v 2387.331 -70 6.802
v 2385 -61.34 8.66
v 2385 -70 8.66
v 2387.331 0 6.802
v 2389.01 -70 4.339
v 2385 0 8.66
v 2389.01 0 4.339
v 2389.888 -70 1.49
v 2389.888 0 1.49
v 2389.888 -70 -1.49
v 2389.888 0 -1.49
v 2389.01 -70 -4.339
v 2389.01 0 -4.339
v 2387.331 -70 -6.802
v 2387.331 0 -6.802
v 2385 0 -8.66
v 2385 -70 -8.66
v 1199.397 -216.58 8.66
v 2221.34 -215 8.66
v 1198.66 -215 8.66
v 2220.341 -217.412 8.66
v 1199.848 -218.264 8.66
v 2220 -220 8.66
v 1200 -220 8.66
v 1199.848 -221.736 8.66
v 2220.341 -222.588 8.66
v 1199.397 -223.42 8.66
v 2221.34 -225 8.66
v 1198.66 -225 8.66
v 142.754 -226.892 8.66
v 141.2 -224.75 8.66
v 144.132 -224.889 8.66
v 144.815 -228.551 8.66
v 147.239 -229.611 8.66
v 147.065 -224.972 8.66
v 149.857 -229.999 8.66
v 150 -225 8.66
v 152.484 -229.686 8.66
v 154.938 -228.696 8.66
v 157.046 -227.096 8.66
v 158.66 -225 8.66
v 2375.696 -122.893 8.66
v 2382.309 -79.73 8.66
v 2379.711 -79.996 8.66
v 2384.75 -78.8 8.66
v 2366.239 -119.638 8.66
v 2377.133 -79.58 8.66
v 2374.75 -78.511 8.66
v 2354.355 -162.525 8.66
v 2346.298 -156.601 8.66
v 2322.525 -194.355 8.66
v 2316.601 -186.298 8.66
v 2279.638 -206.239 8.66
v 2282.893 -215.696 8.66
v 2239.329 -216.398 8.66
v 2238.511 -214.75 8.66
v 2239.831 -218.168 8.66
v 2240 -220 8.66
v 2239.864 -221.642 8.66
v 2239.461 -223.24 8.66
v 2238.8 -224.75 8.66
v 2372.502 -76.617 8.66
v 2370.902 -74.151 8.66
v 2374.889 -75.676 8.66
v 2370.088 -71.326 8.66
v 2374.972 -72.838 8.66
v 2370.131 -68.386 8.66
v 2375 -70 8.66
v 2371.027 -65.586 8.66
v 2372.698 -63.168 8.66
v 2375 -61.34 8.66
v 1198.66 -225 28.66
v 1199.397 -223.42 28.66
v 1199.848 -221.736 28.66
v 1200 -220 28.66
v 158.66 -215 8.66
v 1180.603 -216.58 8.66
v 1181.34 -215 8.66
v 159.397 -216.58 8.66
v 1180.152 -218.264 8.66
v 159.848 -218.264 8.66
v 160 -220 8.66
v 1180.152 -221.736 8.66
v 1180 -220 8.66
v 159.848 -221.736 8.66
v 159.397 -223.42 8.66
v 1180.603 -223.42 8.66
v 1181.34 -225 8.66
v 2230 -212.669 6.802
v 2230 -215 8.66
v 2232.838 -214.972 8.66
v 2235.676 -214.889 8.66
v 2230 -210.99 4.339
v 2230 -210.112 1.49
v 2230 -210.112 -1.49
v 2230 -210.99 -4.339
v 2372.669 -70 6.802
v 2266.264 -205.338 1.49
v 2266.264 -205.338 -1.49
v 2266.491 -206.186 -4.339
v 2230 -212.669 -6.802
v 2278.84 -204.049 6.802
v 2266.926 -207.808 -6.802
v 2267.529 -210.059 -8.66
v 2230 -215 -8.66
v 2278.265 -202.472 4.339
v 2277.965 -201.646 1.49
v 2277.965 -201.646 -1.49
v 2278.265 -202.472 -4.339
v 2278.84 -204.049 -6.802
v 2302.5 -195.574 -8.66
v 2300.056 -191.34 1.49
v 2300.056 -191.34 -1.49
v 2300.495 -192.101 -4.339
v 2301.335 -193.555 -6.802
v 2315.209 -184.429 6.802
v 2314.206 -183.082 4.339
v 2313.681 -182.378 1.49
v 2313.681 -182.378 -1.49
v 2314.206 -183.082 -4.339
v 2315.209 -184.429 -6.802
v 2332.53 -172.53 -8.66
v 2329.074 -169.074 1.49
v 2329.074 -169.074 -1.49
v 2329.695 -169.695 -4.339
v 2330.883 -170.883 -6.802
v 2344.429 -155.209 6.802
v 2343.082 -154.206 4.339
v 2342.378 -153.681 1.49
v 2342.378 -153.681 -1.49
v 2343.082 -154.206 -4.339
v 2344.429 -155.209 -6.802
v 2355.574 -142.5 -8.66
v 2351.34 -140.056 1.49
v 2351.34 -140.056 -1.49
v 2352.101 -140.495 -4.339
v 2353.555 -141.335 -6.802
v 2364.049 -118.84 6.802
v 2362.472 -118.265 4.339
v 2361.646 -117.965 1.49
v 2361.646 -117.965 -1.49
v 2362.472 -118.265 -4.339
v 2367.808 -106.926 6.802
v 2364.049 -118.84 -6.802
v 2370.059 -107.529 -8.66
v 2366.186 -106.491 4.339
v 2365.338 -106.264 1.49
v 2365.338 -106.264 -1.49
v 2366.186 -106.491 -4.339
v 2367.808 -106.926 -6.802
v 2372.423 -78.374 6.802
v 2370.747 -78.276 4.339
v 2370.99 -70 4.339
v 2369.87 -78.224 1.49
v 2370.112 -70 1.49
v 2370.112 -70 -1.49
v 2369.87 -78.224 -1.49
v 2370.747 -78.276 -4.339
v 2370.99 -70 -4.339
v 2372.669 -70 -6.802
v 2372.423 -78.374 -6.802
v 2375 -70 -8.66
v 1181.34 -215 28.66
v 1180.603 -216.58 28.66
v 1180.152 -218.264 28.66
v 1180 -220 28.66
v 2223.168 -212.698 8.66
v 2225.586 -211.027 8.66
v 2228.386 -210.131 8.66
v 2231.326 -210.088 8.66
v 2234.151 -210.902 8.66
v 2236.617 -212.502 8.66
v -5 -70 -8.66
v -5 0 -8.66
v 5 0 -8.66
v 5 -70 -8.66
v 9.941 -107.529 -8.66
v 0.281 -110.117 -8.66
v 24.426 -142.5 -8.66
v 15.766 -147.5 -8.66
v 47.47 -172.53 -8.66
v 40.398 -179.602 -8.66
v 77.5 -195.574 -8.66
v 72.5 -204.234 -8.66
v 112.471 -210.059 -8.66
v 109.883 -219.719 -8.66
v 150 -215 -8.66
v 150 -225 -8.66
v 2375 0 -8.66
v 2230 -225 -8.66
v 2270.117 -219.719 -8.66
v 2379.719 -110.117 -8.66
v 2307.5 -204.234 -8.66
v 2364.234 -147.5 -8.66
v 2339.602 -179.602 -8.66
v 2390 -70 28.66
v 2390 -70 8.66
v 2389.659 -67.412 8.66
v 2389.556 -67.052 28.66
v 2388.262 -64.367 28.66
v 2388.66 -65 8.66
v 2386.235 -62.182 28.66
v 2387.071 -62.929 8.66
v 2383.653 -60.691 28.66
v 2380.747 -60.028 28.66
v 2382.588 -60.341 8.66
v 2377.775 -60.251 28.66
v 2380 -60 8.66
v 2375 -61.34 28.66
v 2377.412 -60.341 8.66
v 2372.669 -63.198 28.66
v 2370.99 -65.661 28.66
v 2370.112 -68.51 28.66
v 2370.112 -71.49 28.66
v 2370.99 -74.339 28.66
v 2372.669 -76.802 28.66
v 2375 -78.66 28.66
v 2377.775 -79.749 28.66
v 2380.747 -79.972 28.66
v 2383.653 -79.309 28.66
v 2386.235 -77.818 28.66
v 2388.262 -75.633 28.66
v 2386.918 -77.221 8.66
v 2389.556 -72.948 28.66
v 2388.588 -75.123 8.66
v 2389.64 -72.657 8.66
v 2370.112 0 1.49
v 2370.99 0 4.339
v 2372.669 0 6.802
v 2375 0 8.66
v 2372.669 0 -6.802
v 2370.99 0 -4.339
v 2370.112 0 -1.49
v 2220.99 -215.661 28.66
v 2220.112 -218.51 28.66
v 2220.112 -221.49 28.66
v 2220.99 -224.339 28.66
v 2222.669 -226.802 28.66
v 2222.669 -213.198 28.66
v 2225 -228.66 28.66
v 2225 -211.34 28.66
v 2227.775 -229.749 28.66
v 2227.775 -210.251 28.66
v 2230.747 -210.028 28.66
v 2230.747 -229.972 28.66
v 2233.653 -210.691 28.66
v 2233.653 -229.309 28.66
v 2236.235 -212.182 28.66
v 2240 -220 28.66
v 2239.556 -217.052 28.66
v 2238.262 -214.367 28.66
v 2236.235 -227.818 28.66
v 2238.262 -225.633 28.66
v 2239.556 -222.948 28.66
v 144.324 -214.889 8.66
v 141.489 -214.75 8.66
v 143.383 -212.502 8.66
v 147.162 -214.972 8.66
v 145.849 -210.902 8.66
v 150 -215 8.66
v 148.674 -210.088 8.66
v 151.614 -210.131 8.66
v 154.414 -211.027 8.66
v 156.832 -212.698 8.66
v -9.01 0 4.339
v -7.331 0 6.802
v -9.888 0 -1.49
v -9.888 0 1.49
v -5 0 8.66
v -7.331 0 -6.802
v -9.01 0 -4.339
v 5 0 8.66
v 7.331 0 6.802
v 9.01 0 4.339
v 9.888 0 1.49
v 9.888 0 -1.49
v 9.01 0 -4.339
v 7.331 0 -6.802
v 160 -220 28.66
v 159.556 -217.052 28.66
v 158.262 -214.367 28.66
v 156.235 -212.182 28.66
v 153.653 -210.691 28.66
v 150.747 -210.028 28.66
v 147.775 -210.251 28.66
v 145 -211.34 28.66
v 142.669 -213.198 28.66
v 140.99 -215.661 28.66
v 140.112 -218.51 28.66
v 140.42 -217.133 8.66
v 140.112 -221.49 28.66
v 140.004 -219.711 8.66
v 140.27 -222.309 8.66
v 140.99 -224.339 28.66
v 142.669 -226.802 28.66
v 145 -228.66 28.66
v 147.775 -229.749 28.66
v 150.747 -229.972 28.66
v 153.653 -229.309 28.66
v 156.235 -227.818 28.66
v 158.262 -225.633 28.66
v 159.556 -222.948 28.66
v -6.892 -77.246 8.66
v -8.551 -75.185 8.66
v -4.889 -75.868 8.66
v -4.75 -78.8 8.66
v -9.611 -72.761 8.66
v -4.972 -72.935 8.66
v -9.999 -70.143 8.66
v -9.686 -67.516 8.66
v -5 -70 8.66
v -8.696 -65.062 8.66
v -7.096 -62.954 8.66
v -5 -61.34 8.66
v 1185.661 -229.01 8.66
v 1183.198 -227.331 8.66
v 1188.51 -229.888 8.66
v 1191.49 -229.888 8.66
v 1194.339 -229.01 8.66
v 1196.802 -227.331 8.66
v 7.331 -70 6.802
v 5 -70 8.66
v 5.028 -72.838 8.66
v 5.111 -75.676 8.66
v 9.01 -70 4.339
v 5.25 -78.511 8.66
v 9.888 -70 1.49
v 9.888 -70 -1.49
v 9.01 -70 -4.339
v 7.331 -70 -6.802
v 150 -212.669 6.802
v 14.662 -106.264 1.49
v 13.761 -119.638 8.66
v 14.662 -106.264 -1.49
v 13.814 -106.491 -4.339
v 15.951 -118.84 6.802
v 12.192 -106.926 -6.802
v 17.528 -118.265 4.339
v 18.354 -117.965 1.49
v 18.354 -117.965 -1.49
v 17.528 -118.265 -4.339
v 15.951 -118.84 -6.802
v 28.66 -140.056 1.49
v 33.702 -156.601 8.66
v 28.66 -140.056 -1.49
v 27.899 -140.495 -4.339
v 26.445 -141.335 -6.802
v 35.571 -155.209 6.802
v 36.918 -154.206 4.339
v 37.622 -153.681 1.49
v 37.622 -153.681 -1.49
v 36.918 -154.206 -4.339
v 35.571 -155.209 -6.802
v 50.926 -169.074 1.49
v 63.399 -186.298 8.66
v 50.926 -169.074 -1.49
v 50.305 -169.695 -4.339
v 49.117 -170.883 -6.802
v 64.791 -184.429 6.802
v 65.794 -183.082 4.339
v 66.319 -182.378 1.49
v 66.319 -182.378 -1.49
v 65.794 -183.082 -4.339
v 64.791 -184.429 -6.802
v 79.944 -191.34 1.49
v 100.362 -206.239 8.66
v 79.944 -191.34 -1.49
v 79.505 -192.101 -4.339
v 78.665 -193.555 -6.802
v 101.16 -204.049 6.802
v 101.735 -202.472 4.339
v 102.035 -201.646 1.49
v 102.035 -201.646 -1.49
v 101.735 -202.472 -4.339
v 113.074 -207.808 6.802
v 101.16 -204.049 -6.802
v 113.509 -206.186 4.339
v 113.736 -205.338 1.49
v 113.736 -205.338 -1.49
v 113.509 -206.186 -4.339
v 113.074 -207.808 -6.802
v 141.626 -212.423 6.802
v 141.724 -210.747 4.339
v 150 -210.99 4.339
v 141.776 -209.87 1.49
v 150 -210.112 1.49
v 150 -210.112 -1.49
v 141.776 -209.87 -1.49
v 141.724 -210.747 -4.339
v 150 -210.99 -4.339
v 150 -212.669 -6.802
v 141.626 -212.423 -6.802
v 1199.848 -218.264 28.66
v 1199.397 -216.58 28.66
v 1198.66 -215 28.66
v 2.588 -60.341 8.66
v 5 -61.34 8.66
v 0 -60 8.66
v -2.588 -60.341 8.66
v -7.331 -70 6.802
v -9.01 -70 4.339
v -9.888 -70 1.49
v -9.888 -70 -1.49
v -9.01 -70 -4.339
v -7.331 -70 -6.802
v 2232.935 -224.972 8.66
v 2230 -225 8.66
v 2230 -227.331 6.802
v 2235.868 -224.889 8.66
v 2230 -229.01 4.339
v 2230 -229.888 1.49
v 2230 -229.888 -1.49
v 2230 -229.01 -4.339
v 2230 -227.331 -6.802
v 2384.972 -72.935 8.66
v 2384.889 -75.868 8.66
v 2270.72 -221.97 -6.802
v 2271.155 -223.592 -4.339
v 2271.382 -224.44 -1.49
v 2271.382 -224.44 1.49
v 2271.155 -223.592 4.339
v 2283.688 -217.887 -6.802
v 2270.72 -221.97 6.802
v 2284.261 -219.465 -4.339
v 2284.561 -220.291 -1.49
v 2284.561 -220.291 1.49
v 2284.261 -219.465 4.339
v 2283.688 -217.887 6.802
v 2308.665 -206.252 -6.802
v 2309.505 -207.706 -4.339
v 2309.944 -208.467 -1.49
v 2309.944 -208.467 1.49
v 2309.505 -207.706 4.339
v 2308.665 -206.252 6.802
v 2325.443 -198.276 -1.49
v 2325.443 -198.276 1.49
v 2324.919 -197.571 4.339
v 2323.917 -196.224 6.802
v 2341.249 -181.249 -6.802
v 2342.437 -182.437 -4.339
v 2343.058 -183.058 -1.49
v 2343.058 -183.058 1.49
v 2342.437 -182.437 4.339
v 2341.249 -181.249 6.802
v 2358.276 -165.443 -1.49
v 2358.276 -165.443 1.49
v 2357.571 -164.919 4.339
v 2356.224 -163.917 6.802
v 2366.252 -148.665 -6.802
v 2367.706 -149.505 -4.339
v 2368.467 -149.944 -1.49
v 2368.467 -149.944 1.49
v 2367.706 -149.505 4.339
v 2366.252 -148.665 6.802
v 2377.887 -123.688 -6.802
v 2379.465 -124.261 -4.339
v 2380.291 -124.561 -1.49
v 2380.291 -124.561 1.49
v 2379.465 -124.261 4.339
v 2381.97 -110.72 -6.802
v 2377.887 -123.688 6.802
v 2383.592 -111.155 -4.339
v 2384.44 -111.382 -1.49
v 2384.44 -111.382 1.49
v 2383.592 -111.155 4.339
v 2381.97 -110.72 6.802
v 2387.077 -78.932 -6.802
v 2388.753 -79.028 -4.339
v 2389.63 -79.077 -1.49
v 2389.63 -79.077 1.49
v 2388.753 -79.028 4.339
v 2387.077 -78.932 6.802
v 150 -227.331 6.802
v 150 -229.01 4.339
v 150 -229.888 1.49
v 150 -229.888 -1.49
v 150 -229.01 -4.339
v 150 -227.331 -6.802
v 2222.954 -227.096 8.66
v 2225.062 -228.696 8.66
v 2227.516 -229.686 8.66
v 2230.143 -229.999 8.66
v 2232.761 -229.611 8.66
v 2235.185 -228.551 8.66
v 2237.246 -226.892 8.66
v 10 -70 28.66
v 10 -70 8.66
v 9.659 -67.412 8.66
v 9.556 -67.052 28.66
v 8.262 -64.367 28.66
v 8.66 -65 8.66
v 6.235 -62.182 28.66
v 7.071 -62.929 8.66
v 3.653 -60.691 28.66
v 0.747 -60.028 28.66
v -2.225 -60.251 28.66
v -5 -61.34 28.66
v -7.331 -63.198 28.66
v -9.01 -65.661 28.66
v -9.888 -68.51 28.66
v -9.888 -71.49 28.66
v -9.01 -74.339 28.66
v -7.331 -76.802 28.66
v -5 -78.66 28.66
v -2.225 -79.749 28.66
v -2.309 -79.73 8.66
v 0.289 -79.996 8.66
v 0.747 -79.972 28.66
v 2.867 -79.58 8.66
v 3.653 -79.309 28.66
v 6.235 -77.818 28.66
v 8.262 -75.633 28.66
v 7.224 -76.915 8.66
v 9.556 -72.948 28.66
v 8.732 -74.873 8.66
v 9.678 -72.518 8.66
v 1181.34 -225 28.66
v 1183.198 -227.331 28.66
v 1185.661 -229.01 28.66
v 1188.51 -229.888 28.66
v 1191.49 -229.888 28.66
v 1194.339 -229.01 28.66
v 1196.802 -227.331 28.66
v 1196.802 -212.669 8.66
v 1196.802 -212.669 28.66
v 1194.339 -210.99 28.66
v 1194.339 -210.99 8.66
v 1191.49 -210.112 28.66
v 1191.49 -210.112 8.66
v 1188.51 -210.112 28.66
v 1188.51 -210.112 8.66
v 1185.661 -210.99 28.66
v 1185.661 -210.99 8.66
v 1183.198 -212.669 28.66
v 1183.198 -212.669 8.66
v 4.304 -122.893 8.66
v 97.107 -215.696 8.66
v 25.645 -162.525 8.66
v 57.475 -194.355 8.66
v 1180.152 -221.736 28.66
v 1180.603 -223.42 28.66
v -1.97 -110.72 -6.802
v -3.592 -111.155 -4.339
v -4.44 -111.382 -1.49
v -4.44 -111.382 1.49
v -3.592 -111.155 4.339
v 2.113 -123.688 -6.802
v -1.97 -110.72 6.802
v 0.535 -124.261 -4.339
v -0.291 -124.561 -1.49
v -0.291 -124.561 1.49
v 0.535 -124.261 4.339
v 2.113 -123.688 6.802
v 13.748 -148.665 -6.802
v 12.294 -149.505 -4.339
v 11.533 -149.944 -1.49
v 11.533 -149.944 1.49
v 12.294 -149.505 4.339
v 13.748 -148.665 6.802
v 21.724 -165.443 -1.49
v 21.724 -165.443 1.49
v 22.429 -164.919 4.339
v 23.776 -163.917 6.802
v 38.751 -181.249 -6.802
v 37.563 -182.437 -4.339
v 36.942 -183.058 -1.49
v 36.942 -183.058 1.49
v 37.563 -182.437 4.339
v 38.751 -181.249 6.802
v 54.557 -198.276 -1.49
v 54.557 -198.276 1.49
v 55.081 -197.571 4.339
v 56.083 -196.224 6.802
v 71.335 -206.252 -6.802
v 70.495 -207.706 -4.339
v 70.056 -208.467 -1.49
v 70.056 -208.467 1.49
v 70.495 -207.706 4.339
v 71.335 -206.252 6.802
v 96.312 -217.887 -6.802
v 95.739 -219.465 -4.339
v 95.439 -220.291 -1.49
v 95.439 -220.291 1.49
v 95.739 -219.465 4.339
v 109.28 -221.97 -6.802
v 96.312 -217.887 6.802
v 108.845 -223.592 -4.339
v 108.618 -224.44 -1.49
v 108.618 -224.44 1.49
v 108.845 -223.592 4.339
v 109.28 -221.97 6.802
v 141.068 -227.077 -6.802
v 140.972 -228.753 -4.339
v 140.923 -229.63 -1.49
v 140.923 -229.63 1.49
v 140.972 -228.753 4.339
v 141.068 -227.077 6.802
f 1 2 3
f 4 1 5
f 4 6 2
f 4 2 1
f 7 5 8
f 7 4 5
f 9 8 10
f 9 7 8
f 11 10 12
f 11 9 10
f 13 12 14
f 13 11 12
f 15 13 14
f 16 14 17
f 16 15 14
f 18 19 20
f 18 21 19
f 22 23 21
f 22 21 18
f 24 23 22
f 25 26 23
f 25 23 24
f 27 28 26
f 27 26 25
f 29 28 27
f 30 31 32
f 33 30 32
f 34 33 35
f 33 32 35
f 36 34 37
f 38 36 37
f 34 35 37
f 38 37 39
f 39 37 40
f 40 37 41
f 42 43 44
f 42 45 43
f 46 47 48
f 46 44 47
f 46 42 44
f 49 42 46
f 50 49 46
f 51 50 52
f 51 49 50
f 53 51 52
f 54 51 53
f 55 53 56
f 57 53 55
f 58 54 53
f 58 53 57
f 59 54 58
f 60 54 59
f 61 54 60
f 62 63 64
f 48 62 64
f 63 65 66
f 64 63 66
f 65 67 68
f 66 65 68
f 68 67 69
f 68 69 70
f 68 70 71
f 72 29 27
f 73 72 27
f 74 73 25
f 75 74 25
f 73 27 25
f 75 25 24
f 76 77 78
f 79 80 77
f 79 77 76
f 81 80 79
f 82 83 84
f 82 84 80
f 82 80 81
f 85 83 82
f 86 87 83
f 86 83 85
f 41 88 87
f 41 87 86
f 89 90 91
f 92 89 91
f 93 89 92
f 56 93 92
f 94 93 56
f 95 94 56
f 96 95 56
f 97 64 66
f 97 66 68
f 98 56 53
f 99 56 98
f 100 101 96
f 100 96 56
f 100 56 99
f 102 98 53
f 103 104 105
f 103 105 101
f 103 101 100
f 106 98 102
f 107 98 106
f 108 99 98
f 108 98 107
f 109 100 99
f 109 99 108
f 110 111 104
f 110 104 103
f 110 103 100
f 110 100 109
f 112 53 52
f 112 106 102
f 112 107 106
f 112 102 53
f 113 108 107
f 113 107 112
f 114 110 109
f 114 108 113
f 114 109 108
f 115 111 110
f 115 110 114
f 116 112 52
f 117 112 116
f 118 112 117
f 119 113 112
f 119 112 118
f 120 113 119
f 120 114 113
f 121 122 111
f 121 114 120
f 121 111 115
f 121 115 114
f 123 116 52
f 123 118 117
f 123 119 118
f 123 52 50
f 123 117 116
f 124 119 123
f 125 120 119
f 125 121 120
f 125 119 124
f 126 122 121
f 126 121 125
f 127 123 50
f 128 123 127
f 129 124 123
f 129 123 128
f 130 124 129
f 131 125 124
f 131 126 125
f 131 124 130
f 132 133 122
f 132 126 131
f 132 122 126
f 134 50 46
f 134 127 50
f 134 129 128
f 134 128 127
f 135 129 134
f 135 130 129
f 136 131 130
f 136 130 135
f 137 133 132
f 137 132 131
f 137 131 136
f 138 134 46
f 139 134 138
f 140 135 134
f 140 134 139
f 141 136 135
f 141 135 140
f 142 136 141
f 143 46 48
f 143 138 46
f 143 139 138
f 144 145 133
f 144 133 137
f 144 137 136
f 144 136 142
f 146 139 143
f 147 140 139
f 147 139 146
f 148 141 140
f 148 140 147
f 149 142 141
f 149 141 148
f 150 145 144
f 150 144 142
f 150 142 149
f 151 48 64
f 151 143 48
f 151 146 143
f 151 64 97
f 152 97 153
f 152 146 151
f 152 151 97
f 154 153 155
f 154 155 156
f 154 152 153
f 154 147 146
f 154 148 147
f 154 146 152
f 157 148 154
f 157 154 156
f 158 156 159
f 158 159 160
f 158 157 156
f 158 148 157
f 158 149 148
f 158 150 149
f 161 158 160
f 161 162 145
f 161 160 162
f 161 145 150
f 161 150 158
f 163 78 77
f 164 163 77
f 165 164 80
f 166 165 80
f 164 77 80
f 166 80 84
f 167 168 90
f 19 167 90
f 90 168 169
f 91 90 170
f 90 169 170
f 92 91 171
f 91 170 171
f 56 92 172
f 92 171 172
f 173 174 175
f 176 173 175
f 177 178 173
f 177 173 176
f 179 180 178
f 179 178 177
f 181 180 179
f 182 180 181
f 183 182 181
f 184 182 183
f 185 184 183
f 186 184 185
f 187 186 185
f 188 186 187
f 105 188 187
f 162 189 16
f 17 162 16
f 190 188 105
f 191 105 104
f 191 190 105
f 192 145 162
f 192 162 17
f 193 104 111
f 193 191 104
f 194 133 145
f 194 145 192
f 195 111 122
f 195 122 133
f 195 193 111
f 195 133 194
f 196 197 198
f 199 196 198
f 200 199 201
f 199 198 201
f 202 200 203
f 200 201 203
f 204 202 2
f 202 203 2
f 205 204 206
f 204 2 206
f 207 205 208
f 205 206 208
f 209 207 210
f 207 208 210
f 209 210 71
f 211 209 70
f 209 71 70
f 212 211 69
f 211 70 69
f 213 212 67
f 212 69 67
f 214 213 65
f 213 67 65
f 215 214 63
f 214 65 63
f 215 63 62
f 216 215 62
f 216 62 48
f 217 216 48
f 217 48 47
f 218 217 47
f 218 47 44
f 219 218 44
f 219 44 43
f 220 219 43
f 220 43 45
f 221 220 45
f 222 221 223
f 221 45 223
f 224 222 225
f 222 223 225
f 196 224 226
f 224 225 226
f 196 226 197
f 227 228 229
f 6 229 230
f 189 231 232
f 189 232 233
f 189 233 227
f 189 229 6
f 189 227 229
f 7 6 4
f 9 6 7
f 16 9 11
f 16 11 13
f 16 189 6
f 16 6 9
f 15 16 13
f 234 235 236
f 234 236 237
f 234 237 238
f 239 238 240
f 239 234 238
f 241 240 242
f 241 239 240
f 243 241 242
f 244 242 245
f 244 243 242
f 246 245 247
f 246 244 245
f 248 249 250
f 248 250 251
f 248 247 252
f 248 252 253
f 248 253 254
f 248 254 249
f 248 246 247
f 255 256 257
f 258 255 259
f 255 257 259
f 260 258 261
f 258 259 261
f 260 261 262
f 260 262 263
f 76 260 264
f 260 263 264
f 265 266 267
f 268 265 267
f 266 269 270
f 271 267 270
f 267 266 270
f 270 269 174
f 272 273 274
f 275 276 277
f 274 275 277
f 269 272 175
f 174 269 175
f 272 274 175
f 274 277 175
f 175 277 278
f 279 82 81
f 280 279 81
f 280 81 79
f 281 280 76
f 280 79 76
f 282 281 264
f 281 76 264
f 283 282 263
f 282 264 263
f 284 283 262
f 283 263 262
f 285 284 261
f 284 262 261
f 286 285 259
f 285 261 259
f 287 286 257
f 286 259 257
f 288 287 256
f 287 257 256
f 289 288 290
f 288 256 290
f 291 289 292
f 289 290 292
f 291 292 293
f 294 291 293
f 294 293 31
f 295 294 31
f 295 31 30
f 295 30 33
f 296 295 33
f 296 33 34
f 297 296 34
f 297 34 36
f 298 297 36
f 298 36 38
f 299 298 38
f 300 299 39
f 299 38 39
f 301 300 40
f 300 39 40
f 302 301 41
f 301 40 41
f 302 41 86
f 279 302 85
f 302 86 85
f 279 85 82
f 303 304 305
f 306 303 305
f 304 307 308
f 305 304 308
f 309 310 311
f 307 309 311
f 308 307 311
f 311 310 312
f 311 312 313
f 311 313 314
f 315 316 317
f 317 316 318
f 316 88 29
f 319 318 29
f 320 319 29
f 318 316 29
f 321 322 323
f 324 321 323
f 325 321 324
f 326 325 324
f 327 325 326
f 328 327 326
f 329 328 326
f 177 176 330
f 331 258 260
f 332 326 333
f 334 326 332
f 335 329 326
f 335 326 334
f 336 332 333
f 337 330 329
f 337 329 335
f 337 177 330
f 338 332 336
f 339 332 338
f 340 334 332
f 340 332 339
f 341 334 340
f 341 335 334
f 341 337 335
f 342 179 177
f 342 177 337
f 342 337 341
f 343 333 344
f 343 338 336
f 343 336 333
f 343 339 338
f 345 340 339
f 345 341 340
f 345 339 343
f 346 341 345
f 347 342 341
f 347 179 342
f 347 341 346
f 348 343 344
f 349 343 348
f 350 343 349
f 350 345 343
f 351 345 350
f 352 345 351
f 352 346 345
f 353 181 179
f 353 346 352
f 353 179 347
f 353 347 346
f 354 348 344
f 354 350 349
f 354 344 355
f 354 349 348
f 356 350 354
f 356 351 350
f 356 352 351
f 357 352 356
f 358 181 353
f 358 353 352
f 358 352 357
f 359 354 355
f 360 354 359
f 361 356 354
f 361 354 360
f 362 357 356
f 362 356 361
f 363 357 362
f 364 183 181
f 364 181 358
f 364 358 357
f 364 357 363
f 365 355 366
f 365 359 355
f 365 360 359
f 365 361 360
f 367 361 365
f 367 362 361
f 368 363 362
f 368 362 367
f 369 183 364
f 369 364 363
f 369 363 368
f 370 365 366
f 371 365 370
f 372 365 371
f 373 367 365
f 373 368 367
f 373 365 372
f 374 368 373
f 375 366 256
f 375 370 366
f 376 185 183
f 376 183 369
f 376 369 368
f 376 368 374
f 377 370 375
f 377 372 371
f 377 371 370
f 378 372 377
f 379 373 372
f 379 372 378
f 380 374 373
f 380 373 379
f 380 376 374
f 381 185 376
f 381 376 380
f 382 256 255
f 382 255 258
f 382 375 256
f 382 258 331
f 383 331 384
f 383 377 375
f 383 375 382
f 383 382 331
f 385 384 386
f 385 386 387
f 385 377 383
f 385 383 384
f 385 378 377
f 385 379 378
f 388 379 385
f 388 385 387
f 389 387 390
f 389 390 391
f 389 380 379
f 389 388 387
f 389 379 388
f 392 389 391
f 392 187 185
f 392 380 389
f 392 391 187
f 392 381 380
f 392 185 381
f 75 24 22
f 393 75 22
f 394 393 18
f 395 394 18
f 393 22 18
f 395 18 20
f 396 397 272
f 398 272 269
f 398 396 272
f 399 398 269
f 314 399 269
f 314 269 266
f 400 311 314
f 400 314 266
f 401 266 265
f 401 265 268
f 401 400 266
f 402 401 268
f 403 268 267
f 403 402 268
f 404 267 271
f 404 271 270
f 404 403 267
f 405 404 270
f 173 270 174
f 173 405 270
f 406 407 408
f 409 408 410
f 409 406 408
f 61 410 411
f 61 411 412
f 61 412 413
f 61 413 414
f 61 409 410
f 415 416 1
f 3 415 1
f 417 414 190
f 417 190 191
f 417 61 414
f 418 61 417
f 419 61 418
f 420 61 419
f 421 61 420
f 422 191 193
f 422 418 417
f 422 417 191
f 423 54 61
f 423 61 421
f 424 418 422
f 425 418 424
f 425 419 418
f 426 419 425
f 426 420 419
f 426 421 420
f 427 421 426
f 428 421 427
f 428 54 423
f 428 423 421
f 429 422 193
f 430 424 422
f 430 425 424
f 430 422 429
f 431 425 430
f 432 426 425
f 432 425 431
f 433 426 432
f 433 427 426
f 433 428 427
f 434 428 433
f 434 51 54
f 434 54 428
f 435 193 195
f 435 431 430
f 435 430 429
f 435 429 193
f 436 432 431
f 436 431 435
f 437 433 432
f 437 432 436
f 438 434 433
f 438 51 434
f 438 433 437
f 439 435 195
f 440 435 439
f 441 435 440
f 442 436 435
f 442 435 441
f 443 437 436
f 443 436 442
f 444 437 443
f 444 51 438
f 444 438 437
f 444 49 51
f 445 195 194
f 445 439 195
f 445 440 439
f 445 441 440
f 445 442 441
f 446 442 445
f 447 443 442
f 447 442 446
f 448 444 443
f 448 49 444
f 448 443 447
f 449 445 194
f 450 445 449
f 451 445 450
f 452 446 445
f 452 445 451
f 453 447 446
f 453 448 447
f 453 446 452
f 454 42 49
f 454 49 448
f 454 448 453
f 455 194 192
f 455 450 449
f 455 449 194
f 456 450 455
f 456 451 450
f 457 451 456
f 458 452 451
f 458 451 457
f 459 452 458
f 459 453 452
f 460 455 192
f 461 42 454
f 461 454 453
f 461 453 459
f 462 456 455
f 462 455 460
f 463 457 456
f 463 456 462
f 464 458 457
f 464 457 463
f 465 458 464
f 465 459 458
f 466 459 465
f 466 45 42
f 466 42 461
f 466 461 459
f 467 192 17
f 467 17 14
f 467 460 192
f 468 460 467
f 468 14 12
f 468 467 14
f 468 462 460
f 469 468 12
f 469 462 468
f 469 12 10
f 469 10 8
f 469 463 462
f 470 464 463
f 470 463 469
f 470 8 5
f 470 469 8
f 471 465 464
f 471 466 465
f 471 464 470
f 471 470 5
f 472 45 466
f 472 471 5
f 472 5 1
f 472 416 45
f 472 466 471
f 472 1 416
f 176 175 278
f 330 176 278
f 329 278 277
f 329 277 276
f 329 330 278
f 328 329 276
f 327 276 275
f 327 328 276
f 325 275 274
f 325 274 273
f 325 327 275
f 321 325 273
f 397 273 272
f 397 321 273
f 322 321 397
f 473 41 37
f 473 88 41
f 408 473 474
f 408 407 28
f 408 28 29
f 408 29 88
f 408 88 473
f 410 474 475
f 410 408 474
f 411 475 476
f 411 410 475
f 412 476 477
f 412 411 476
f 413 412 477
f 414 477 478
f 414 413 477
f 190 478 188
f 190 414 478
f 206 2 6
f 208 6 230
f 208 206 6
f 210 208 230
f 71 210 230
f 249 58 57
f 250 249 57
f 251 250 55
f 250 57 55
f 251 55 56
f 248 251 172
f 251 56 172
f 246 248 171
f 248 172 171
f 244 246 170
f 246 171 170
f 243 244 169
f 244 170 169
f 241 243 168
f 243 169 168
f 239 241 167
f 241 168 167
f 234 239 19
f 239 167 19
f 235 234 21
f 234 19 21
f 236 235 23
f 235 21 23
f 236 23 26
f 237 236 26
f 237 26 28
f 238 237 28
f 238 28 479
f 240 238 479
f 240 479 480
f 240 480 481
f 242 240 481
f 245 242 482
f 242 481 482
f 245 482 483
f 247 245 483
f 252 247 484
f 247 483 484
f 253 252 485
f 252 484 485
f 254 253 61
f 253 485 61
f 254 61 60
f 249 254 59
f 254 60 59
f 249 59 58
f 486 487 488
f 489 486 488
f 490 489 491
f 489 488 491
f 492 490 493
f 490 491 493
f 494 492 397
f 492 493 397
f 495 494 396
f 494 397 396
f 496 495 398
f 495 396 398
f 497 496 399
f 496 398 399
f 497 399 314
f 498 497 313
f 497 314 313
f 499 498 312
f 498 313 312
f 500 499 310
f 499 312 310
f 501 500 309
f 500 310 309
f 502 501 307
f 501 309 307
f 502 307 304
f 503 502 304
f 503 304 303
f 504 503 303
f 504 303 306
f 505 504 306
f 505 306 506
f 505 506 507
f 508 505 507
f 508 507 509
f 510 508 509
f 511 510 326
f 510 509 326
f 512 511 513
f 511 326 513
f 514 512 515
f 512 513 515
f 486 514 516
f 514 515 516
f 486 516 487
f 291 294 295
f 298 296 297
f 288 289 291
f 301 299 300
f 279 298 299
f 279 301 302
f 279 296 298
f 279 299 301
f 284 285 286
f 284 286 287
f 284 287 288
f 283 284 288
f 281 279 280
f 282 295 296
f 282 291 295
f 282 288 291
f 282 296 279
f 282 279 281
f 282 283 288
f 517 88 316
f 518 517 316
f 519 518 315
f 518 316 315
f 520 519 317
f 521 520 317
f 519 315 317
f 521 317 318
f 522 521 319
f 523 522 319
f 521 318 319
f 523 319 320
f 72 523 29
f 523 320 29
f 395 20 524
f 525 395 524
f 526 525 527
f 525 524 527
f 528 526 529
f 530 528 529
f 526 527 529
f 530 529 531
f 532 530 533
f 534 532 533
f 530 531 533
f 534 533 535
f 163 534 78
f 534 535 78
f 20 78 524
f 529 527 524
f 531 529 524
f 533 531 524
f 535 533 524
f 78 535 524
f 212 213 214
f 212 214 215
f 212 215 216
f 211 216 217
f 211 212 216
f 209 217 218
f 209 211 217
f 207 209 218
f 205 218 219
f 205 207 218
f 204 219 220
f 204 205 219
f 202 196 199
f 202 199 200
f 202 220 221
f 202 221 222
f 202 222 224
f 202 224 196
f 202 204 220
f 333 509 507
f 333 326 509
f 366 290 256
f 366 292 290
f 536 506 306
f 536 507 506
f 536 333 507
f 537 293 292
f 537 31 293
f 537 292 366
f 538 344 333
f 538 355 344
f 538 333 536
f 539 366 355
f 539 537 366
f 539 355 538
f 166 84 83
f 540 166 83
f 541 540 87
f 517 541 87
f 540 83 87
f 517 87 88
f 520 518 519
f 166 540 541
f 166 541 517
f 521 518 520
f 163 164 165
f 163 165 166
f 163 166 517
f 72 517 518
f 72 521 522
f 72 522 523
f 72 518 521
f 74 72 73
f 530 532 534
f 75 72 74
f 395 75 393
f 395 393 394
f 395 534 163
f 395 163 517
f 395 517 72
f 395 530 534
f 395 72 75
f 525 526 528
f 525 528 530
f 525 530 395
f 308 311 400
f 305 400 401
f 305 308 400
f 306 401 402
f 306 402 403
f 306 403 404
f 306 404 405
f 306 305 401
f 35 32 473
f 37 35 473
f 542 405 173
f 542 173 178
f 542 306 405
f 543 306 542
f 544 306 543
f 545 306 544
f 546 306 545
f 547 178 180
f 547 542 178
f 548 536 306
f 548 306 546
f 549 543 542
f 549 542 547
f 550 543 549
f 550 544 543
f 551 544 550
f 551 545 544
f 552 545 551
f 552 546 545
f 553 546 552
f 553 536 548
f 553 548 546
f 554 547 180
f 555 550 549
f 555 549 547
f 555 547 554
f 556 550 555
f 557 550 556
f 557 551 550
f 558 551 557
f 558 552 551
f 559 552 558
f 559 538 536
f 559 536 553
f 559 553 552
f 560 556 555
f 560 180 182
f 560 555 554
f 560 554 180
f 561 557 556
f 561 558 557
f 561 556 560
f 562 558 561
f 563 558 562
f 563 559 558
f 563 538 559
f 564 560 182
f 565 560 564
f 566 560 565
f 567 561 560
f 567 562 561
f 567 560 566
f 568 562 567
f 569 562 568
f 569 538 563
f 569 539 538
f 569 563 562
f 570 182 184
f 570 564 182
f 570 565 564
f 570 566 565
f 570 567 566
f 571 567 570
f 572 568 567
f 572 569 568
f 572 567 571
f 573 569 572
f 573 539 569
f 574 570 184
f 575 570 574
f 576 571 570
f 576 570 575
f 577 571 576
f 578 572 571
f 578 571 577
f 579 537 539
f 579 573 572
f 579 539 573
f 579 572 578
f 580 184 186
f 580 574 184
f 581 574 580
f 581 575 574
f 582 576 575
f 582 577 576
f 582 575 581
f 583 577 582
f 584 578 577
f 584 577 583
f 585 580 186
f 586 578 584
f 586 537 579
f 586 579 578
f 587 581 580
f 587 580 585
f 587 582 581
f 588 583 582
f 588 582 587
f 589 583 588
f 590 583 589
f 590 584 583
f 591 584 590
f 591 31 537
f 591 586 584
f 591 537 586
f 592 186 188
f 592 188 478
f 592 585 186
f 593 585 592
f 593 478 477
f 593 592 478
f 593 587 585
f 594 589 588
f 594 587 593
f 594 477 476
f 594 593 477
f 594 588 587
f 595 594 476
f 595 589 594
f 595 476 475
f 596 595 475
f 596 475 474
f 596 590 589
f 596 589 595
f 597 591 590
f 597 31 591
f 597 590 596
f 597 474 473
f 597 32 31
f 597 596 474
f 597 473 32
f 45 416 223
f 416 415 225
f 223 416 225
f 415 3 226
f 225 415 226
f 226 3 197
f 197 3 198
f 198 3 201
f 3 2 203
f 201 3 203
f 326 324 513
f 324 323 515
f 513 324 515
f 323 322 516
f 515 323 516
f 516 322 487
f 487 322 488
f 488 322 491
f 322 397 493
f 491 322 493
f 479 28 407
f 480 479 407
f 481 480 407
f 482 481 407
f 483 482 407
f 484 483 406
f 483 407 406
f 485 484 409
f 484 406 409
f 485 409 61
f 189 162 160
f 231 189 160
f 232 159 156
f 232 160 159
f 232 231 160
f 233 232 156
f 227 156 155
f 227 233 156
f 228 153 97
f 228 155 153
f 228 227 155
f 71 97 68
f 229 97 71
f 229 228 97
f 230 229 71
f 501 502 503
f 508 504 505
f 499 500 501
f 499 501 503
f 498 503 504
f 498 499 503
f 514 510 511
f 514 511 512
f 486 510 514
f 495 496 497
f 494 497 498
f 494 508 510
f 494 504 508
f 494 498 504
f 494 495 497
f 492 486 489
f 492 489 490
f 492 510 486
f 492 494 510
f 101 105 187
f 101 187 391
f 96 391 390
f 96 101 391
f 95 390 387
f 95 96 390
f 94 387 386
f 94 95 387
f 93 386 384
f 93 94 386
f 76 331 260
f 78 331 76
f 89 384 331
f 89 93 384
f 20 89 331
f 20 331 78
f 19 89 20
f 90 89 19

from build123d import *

# Parameters (mm, degrees)
F3_R     = 10
F4_DEPTH = 20
F6_DEPTH = 20


with BuildPart() as f2:
    # F2: sweep along a path in F1
    with BuildLine(Plane.XY) as f2_path:
        Line((0, 0), (0, -70))
        ThreePointArc((0, -70), (43.933982822, -176.066017178), (150, -220))
        Line((150, -220), (2230, -220))
        ThreePointArc((2230, -220), (2336.066017178, -176.066017178), (2380, -70))
        Line((2380, -70), (2380, 0))
    # F0 (on Front) → F2 (sweep)
    with BuildSketch(Plane.XZ):
        with BuildLine():
            Line((0, 8.6602540378), (-5, 8.6602540378))
            ThreePointArc((-5, 8.6602540378), (-10, 0), (-5, -8.6602540378))
            Line((-5, -8.6602540378), (5, -8.6602540378))
            ThreePointArc((5, -8.6602540378), (10, 0), (5, 8.6602540378))
            Line((5, 8.6602540378), (0, 8.6602540378))
        make_face()
    sweep(path=f2_path.line)

    # F3 (on face) → F4 (join)
    with BuildSketch(Plane.XY.offset(8.6602540378)):
        with Locations((0, -70)):
            Circle(F3_R)
        with Locations((150, -220)):
            Circle(F3_R)
        with Locations((2380, -70)):
            Circle(F3_R)
        with Locations((2230, -220)):
            Circle(F3_R)
    extrude(amount=F4_DEPTH)

    # F5 (on face) → F6 (join)
    with BuildSketch(Plane.XY.offset(8.6602540378)):
        with BuildLine():
            Line((1198.6602540378, -215), (1190, -215))
            Line((1190, -215), (1190, -220))
            Line((1190, -220), (1190, -225))
            Line((1190, -225), (1198.6602540378, -225))
            ThreePointArc((1198.6602540378, -225), (1199.6592582629, -222.588190451), (1200, -220))
            ThreePointArc((1200, -220), (1199.6592582629, -217.411809549), (1198.6602540378, -215))
        make_face()
        with BuildLine():
            Line((1181.3397459622, -215), (1190, -215))
            Line((1190, -215), (1198.6602540378, -215))
            ThreePointArc((1198.6602540378, -215), (1190, -210), (1181.3397459622, -215))
        make_face()
        with BuildLine():
            Line((1190, -220), (1190, -215))
            Line((1190, -215), (1181.3397459622, -215))
            ThreePointArc((1181.3397459622, -215), (1180.3407417371, -217.411809549), (1180, -220))
            Line((1180, -220), (1190, -220))
        make_face()
        with BuildLine():
            Line((1190, -225), (1190, -220))
            Line((1190, -220), (1180, -220))
            ThreePointArc((1180, -220), (1180.3407417371, -222.588190451), (1181.3397459622, -225))
            Line((1181.3397459622, -225), (1190, -225))
        make_face()
        with BuildLine():
            Line((1198.6602540378, -225), (1190, -225))
            Line((1190, -225), (1181.3397459622, -225))
            ThreePointArc((1181.3397459622, -225), (1190, -230), (1198.6602540378, -225))
        make_face()
    extrude(amount=F6_DEPTH)


solid = f2.part
